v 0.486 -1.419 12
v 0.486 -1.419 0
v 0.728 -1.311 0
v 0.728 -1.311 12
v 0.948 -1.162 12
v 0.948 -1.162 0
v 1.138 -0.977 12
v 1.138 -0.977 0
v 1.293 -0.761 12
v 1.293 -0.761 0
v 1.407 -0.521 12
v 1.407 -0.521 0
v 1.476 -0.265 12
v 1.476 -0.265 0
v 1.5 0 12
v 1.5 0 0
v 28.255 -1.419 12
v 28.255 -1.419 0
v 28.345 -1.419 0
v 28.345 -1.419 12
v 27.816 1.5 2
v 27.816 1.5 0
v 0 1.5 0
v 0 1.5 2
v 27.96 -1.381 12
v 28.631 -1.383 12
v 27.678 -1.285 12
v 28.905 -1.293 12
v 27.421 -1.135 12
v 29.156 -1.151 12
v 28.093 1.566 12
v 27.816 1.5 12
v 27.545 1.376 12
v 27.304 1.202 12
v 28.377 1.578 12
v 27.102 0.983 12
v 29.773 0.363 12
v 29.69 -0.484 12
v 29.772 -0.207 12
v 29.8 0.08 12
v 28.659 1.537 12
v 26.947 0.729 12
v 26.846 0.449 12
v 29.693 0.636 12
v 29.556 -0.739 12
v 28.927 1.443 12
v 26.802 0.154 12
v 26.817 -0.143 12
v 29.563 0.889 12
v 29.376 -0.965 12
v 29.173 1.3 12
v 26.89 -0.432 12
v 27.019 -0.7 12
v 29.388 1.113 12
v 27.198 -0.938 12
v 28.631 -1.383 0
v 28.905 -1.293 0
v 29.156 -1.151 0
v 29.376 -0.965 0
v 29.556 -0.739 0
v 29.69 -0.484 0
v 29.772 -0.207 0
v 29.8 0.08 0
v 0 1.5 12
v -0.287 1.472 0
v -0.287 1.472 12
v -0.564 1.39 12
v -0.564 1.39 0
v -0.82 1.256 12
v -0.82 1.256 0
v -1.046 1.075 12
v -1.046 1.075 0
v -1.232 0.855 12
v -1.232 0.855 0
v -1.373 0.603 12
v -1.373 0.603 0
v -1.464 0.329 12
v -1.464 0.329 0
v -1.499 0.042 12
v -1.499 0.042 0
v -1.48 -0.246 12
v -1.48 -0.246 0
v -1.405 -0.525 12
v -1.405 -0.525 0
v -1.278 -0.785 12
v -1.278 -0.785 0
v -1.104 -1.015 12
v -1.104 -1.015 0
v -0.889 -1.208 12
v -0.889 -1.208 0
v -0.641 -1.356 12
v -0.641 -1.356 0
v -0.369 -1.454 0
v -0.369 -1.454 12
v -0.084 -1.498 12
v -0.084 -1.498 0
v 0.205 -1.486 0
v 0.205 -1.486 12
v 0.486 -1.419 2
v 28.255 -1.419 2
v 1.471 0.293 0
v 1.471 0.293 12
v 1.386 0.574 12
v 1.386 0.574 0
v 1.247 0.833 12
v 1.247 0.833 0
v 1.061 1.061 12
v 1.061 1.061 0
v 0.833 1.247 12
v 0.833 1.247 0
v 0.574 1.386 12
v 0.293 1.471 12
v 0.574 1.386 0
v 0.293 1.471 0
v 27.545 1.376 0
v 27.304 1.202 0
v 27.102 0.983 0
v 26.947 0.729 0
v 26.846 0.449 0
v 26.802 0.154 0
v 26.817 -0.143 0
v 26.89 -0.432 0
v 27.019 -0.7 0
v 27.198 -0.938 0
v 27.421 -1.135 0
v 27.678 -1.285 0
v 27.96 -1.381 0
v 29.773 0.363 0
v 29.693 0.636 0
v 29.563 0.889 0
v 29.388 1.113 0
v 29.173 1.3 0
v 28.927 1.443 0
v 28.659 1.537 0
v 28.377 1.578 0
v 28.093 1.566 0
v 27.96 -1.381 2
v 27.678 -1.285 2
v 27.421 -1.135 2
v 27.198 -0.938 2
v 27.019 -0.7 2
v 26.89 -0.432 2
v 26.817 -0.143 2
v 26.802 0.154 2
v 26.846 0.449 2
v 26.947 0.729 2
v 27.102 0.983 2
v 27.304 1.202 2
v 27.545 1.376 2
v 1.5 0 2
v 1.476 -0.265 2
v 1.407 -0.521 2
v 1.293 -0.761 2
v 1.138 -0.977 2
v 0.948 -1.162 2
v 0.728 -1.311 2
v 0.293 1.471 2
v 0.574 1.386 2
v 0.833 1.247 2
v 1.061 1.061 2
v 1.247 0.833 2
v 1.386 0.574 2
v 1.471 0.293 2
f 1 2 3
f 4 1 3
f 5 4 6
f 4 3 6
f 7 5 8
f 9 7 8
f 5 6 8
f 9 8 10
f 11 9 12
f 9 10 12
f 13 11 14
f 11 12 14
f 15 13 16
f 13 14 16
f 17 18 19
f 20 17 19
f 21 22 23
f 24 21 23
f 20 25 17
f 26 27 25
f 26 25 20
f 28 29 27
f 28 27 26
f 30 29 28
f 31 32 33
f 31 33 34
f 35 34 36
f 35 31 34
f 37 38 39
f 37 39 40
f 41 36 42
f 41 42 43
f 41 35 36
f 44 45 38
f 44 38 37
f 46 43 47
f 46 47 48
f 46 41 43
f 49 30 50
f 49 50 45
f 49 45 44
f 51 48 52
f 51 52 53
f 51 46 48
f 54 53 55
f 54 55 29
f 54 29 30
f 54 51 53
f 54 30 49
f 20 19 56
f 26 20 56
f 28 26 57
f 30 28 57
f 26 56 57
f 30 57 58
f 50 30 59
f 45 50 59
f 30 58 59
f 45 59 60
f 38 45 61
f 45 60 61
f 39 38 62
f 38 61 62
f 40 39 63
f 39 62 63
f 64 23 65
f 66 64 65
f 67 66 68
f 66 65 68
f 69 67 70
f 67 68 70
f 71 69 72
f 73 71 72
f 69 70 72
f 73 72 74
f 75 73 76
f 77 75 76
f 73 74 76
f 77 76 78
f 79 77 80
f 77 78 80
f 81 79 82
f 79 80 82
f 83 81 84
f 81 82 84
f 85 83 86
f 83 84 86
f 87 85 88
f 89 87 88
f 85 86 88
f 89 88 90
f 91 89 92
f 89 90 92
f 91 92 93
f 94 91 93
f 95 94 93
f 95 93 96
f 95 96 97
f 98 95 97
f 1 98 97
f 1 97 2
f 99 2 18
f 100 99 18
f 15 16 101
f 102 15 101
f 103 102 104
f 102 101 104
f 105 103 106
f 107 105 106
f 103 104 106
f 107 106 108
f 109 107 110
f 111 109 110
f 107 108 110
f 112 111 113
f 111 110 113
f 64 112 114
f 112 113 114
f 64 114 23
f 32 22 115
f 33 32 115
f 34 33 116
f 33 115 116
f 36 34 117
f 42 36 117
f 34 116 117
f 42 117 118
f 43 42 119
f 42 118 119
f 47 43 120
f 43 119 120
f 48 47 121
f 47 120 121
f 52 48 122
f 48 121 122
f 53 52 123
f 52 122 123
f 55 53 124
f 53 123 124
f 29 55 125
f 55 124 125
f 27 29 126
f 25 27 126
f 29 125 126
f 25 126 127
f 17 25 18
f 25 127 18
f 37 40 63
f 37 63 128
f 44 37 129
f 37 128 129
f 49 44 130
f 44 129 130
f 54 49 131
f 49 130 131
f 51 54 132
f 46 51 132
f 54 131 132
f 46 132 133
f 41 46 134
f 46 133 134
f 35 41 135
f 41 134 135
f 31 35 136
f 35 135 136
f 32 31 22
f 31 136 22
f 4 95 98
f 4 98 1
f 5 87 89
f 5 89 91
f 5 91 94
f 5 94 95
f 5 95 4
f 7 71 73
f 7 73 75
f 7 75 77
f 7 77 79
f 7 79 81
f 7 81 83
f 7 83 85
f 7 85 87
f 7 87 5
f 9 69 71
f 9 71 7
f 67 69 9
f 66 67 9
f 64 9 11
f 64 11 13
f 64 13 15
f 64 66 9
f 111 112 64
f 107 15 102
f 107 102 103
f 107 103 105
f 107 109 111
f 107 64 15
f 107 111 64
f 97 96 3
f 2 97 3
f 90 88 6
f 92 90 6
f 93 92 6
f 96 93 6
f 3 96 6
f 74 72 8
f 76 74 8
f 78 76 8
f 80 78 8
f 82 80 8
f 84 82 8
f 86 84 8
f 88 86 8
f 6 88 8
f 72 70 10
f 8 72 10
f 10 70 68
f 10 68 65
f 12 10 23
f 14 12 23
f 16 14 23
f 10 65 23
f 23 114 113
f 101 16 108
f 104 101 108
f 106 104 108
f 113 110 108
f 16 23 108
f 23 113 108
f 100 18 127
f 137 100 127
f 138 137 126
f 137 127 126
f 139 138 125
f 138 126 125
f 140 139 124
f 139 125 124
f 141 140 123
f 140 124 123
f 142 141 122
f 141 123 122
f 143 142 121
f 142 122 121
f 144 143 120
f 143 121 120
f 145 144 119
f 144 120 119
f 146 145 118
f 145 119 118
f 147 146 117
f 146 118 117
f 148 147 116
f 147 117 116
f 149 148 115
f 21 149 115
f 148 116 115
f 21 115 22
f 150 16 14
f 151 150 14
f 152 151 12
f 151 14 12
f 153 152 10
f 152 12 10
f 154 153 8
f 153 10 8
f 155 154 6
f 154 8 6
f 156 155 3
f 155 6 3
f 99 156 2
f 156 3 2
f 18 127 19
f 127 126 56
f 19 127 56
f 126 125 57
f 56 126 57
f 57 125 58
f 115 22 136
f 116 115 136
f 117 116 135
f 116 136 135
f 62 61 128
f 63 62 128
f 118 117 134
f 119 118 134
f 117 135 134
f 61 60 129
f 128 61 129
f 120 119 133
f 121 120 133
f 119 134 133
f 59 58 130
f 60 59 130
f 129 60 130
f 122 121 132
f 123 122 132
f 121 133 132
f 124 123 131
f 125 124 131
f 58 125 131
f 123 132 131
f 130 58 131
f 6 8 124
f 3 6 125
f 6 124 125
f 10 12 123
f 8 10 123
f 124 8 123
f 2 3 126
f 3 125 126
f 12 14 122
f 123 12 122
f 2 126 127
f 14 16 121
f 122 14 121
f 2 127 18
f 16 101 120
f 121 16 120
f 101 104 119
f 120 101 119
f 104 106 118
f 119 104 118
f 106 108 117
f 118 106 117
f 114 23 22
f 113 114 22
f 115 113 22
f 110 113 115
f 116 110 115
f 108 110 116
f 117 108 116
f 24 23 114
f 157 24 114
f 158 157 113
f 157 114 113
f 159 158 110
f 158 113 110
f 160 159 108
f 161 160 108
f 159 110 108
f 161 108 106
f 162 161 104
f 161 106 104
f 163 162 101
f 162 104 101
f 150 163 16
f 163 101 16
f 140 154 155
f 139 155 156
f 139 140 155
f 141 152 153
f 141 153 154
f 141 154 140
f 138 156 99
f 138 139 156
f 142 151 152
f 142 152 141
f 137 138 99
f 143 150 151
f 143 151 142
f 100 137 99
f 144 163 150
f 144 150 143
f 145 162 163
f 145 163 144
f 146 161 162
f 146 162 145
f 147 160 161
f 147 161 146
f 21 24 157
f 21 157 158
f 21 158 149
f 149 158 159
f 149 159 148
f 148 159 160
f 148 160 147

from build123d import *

# Parameters (mm, degrees)
F1_DEPTH = 12
F2_DEPTH = 2


with BuildPart() as f1:
    # F0 (on Top) → F1 (new body)
    with BuildSketch(Plane.XY):
        with BuildLine():
            ThreePointArc((0.485728788, -1.4191784752), (1.2203674, -0.8721831281), (1.5, 0))
            ThreePointArc((1.5, 0), (1.0606601718, 1.0606601718), (0, 1.5))
            Line((0, 1.5), (0, -1.4191784752))
            Line((0, -1.4191784752), (0.485728788, -1.4191784752))
        make_face()
        with BuildLine():
            Line((0, -1.4191784752), (0, 1.5))
            ThreePointArc((0, 1.5), (-1.4796566684, -0.2462034598), (0.485728788, -1.4191784752))
            Line((0.485728788, -1.4191784752), (0, -1.4191784752))
        make_face()
    extrude(amount=F1_DEPTH)


with BuildPart() as f1b:
    # F0 (on Top) → F1, piece 2 (new body)
    with BuildSketch(Plane.XY):
        with BuildLine():
            ThreePointArc((29.8, 0.0801584756), (29.1730175297, 1.2999291068), (27.8162128096, 1.5))
            Line((27.8162128096, 1.5), (28.3445949316, 1.5))
            Line((28.3445949316, 1.5), (28.3445949316, -1.4191784752))
            ThreePointArc((28.3445949316, -1.4191784752), (29.3763113856, -0.9646160461), (29.8, 0.0801584756))
        make_face()
        with BuildLine():
            Line((28.3445949316, 1.5), (27.8162128096, 1.5))
            ThreePointArc((27.8162128096, 1.5), (26.8166936732, -0.143005905), (28.2554050684, -1.4191784752))
            Line((28.2554050684, -1.4191784752), (28.3445949316, -1.4191784752))
            Line((28.3445949316, -1.4191784752), (28.3445949316, 1.5))
        make_face()
    extrude(amount=F1_DEPTH)


with BuildPart() as f2:
    # F0 (on Top) → F2 (new body)
    with BuildSketch(Plane.XY):
        with BuildLine():
            ThreePointArc((0, 1.5), (1.0606601718, 1.0606601718), (1.5, 0))
            ThreePointArc((1.5, 0), (1.2203674, -0.8721831281), (0.485728788, -1.4191784752))
            Line((0.485728788, -1.4191784752), (28.2554050684, -1.4191784752))
            ThreePointArc((28.2554050684, -1.4191784752), (26.8166936732, -0.143005905), (27.8162128096, 1.5))
            Line((27.8162128096, 1.5), (0, 1.5))
        make_face()
    extrude(amount=F2_DEPTH)


solid = Compound([f1.part, f1b.part, f2.part])
